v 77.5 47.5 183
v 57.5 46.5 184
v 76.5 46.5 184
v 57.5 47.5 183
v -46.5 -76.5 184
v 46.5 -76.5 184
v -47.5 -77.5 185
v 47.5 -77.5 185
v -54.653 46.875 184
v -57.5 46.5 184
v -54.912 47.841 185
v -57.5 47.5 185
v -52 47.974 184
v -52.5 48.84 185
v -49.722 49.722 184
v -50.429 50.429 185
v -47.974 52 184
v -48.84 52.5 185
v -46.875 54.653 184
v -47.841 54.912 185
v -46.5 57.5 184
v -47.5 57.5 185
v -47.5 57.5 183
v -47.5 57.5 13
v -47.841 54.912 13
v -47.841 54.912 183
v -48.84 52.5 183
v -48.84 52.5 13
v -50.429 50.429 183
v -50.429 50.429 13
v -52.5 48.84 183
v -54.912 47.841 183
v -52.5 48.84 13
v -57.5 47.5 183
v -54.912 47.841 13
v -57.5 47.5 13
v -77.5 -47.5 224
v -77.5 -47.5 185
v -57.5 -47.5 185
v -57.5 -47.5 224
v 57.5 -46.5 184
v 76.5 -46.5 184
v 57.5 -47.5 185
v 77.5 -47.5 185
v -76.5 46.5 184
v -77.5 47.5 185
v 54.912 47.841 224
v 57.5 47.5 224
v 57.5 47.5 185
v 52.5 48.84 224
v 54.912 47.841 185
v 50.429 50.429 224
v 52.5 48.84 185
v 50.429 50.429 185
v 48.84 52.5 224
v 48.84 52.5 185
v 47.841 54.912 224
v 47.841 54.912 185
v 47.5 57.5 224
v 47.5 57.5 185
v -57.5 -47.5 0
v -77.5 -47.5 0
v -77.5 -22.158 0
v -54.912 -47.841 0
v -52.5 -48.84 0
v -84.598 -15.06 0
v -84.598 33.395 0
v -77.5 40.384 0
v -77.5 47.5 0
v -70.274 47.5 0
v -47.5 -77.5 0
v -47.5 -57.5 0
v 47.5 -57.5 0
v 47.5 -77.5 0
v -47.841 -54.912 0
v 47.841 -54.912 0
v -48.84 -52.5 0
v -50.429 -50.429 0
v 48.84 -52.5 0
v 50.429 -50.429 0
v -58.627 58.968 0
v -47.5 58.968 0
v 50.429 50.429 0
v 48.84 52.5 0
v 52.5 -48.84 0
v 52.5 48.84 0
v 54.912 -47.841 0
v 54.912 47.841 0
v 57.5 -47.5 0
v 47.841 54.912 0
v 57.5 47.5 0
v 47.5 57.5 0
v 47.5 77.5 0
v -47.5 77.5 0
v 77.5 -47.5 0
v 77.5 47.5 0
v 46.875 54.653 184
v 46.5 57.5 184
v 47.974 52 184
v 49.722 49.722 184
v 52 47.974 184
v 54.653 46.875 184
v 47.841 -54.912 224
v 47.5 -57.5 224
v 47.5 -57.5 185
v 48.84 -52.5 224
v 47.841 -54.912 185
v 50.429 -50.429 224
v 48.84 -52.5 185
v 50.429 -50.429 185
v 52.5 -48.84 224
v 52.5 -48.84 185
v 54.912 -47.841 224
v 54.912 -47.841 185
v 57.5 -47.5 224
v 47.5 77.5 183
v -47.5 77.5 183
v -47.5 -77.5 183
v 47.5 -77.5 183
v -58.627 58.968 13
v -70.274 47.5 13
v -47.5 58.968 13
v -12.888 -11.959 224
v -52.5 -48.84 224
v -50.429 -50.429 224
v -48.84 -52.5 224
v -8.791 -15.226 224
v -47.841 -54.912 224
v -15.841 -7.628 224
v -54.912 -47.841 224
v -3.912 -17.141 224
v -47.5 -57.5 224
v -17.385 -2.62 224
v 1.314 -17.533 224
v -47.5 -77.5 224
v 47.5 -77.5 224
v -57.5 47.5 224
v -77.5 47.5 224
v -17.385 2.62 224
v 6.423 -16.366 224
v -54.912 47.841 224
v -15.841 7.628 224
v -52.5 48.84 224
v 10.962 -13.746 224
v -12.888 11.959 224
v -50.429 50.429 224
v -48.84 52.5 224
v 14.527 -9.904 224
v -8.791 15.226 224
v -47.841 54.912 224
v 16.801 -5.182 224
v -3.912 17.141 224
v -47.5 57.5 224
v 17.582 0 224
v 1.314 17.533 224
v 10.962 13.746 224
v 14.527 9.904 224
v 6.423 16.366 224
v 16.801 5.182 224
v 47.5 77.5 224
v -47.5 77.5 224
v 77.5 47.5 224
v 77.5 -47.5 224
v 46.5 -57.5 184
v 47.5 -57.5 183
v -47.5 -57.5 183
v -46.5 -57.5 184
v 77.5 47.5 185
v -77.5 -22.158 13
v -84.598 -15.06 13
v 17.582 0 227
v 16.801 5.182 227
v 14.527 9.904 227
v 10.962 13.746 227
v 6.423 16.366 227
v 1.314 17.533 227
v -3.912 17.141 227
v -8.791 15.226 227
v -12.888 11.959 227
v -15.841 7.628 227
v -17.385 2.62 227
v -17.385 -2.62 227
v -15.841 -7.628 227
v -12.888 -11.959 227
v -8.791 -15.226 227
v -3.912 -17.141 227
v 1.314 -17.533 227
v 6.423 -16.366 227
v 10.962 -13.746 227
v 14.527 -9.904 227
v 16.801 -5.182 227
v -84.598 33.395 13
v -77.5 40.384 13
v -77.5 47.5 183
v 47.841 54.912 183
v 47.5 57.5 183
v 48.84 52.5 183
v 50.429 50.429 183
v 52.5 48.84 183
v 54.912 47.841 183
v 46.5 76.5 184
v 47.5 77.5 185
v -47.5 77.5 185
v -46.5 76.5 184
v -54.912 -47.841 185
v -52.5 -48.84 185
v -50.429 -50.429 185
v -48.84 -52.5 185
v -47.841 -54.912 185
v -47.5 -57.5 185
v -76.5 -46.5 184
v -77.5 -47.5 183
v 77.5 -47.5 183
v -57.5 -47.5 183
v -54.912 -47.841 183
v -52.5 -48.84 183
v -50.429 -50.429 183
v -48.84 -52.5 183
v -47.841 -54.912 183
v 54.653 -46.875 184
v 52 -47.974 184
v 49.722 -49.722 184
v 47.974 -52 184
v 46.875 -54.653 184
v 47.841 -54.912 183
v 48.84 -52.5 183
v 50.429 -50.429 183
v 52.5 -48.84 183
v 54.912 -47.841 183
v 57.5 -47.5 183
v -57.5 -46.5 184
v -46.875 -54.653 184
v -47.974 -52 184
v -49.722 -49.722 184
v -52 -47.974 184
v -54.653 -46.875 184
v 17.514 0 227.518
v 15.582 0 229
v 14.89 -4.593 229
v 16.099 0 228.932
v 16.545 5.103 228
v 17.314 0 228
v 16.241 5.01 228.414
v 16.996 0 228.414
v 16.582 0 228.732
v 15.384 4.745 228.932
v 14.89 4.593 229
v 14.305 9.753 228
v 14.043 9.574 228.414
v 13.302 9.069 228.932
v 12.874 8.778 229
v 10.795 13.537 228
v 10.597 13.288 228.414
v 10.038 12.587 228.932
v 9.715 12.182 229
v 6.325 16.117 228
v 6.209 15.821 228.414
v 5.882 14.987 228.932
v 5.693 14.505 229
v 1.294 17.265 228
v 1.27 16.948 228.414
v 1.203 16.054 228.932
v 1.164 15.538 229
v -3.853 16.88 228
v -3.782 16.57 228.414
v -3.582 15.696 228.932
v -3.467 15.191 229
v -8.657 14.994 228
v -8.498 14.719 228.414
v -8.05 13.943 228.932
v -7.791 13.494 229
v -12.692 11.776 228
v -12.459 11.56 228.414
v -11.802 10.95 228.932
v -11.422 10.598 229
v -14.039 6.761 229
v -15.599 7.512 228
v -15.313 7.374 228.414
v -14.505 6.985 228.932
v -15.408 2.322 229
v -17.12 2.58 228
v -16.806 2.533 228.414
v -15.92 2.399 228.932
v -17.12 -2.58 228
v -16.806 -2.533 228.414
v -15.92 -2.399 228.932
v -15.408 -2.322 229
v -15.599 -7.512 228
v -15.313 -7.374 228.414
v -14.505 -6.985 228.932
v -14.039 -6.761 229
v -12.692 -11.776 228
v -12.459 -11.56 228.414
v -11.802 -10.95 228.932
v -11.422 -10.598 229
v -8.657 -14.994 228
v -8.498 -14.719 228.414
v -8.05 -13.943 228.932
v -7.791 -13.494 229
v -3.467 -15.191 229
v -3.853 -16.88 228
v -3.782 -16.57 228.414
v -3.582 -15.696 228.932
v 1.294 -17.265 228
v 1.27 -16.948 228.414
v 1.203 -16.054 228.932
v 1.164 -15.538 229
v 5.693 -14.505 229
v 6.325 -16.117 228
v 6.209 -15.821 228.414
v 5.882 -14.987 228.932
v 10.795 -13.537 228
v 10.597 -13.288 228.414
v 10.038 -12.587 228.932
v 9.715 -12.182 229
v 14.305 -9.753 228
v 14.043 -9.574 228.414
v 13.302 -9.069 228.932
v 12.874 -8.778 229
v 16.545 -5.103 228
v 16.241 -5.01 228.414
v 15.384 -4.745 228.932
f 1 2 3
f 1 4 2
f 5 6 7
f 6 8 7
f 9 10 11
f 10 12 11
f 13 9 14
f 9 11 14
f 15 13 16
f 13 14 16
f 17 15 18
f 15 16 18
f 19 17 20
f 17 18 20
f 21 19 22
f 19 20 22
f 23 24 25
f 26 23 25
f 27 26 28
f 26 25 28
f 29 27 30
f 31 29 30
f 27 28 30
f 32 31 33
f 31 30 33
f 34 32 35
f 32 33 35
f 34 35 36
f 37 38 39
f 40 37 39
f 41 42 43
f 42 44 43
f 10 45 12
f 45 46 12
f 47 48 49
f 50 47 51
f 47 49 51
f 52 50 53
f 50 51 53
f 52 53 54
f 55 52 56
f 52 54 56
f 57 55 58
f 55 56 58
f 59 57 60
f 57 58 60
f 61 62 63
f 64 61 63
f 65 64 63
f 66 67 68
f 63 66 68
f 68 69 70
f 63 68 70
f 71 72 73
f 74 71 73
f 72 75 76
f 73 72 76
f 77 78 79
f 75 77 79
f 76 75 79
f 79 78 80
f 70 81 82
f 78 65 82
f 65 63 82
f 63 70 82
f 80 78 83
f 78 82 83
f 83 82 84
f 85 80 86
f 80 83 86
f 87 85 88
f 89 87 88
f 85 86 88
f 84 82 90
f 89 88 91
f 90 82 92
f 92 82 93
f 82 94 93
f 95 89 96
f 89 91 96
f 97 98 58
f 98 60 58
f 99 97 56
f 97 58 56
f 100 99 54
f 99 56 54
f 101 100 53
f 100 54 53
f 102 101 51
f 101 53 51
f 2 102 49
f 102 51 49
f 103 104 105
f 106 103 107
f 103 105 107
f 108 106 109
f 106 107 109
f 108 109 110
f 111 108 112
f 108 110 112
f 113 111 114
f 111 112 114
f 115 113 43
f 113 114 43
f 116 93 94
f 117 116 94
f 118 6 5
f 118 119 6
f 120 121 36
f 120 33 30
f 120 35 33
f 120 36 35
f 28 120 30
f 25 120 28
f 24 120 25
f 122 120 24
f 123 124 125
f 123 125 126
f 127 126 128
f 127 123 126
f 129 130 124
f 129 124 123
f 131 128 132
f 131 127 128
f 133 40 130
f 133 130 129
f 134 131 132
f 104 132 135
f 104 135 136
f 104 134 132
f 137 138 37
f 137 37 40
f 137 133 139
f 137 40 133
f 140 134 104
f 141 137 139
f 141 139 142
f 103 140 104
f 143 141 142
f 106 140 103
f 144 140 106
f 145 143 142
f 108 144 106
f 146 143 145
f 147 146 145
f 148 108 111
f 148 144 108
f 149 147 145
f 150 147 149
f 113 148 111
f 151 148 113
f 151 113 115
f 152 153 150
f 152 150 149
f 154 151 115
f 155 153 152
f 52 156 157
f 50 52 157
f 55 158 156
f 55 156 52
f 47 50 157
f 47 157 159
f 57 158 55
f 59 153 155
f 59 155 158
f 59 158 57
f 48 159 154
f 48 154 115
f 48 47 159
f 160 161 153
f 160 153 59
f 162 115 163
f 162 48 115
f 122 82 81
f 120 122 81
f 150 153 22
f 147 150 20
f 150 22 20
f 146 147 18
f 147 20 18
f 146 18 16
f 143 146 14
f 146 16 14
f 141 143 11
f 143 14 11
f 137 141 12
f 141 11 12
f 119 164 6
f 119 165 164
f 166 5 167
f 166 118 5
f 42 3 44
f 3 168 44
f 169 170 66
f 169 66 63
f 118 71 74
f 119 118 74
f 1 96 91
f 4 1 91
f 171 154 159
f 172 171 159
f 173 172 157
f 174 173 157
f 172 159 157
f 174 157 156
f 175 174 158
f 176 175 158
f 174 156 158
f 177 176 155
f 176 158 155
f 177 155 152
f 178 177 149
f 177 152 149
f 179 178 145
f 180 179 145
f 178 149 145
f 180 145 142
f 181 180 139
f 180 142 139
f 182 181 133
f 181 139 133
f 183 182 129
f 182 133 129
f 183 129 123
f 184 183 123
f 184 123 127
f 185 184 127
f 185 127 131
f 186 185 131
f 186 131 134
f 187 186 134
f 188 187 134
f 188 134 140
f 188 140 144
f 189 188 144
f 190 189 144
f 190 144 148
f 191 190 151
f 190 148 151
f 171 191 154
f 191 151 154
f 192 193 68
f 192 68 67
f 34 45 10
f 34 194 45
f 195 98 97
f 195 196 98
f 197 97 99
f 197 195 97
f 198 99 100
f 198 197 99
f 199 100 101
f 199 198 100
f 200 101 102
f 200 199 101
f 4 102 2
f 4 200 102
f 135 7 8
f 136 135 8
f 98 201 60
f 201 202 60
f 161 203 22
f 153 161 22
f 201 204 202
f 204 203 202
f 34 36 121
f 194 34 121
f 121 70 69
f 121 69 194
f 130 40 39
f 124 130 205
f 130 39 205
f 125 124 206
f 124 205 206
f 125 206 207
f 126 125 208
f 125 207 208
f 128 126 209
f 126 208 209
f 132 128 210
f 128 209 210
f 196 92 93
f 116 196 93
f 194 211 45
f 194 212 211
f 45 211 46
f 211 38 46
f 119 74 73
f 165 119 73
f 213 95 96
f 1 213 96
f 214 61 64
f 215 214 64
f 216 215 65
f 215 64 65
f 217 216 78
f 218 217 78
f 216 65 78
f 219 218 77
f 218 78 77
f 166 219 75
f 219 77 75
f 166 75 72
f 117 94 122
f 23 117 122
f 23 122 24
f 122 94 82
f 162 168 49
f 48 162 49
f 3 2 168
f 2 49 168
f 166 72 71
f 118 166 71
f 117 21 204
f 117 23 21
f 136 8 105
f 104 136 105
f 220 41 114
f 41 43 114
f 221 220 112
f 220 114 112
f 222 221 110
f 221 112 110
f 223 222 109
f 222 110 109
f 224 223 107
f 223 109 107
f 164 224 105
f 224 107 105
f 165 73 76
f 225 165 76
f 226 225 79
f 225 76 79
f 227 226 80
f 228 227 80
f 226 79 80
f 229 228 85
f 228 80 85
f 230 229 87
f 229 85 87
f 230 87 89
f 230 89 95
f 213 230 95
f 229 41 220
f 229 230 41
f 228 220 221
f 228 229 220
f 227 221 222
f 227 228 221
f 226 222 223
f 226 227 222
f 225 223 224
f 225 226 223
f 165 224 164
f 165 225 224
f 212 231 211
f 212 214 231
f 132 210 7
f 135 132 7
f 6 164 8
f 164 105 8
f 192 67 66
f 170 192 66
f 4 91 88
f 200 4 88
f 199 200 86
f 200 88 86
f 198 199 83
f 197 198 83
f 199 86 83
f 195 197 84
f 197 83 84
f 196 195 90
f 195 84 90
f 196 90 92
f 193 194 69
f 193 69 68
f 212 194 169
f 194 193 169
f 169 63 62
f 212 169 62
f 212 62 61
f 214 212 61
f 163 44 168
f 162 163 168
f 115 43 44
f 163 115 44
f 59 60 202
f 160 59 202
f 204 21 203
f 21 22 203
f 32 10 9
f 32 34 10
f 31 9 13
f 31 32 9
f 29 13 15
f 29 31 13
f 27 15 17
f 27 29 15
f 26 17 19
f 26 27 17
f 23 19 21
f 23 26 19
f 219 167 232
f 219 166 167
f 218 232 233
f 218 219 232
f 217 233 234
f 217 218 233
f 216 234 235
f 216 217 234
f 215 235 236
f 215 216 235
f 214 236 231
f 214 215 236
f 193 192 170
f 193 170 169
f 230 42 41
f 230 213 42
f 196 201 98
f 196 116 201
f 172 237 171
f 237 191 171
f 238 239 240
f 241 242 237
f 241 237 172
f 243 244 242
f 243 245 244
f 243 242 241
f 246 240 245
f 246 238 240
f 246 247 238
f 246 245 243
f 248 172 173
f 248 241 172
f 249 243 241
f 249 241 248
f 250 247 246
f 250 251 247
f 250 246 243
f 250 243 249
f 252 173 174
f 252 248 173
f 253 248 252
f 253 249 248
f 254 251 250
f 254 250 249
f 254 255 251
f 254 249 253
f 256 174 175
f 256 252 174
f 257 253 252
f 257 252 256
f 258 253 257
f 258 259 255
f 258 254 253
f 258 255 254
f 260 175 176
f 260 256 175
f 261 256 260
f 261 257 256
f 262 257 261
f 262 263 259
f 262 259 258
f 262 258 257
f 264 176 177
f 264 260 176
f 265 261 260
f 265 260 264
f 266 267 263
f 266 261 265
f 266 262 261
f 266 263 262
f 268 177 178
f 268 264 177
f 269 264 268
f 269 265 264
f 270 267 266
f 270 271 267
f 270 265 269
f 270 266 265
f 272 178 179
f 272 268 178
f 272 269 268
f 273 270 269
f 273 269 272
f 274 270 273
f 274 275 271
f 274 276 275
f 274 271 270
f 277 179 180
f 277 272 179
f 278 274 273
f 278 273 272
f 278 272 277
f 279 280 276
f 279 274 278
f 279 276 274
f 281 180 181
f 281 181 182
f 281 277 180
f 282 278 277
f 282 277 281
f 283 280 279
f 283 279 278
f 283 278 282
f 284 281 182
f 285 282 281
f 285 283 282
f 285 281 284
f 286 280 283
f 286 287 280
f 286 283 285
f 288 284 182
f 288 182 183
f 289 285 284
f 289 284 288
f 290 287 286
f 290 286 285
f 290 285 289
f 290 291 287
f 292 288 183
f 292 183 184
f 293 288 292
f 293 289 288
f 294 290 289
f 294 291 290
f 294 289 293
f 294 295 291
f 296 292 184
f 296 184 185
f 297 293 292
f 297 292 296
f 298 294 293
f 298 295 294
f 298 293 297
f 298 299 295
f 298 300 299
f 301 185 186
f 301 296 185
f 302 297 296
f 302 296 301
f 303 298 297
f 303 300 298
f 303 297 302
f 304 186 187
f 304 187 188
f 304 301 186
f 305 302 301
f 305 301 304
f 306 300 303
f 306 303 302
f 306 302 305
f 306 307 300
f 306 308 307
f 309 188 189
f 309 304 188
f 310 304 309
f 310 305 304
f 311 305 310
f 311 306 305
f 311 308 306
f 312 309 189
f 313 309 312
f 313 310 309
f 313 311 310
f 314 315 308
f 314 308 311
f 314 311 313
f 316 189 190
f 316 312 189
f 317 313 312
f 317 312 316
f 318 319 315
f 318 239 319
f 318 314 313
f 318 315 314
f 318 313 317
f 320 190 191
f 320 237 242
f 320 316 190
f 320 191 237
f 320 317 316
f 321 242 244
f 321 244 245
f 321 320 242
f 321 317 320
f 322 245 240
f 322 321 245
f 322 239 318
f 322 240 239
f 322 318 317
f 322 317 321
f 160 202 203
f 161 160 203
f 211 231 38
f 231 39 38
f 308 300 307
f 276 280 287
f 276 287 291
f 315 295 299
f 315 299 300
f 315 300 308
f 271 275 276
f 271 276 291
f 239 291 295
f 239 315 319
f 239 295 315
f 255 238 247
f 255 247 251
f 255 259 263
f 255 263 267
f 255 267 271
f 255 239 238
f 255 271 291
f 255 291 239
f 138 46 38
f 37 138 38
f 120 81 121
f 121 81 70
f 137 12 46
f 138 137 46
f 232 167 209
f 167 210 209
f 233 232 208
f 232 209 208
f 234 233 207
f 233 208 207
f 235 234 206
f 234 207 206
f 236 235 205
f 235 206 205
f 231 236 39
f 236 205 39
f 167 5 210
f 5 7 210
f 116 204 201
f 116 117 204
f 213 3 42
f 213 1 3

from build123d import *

# Parameters (mm, degrees)
Y_KSEKLIK_EKSTR_ZYON1_DEPTH     = 13
Y_KSEKLIK_EKSTR_ZYON2_DEPTH     = 224
KES_EKSTR_ZYON1_DEPTH           = 1
KES_EKSTR_ZYON1_TAPER           = 45
KES_EKSTR_ZYON1_OTHER_WAY_DEPTH = 1
KES_EKSTR_ZYON1_OTHER_WAY_TAPER = 45
IZIM8_R                         = 17.581787387
Y_KSEKLIK_EKSTR_ZYON3_DEPTH     = 5
RADYUS2_R                       = 2


with BuildPart() as part:
    # Çizim1 → Yükseklik-Ekstrüzyon1 (new body)
    with BuildSketch(Plane.XY):
        Polygon((-58.626768768, 58.968306861), (-84.598484816, 33.394607486), (-84.598484816, -15.059977091), (-58.626768768, -41.031693139), (-10.172184191, -41.031693139), (15.401515184, -15.059977091), (15.401515184, 32.642615461), (-10.924176216, 58.968306861), align=None)
    extrude(amount=Y_KSEKLIK_EKSTR_ZYON1_DEPTH)

    # Çizim2 → Yükseklik-Ekstrüzyon2 (add)
    with BuildSketch(Plane.XY):
        with BuildLine():
            Line((47.5, 57.5), (47.5, 77.5))
            Line((47.5, 77.5), (-47.5, 77.5))
            Line((-47.5, 77.5), (-47.5, 57.5))
            ThreePointArc((-47.5, 57.5), (-50.428932188, 50.428932188), (-57.5, 47.5))
            Line((-57.5, 47.5), (-77.5, 47.5))
            Line((-77.5, 47.5), (-77.5, -47.5))
            Line((-77.5, -47.5), (-57.5, -47.5))
            ThreePointArc((-57.5, -47.5), (-50.428932188, -50.428932188), (-47.5, -57.5))
            Line((-47.5, -57.5), (-47.5, -77.5))
            Line((-47.5, -77.5), (47.5, -77.5))
            Line((47.5, -77.5), (47.5, -57.5))
            ThreePointArc((47.5, -57.5), (50.428932188, -50.428932188), (57.5, -47.5))
            Line((57.5, -47.5), (77.5, -47.5))
            Line((77.5, -47.5), (77.5, 47.5))
            Line((77.5, 47.5), (57.5, 47.5))
            ThreePointArc((57.5, 47.5), (50.428932188, 50.428932188), (47.5, 57.5))
        make_face()
    extrude(amount=Y_KSEKLIK_EKSTR_ZYON2_DEPTH)

    # Çizim7 → Kes-Ekstrüzyon1 (cut)
    with BuildSketch(Plane.XY.offset(184)):
        with BuildLine():
            Line((57.5, -56.5), (86.5, -56.5))
            Line((86.5, -56.5), (86.5, 56.5))
            Line((86.5, 56.5), (57.5, 56.5))
            ThreePointArc((57.5, 56.5), (56.792893219, 56.792893219), (56.5, 57.5))
            Line((56.5, 57.5), (56.5, 86.5))
            Line((56.5, 86.5), (-56.5, 86.5))
            Line((-56.5, 86.5), (-56.5, 57.5))
            ThreePointArc((-56.5, 57.5), (-56.792893219, 56.792893219), (-57.5, 56.5))
            Line((-57.5, 56.5), (-86.5, 56.5))
            Line((-86.5, 56.5), (-86.5, -56.5))
            Line((-86.5, -56.5), (-57.5, -56.5))
            ThreePointArc((-57.5, -56.5), (-56.792893219, -56.792893219), (-56.5, -57.5))
            Line((-56.5, -57.5), (-56.5, -86.5))
            Line((-56.5, -86.5), (56.5, -86.5))
            Line((56.5, -86.5), (56.5, -57.5))
            ThreePointArc((56.5, -57.5), (56.792893219, -56.792893219), (57.5, -56.5))
        make_face()
        with BuildLine():
            Line((-46.5, -76.5), (46.5, -76.5))
            Line((46.5, -76.5), (46.5, -57.5))
            ThreePointArc((46.5, -57.5), (49.721825407, -49.721825407), (57.5, -46.5))
            Line((57.5, -46.5), (76.5, -46.5))
            Line((76.5, -46.5), (76.5, 46.5))
            Line((76.5, 46.5), (57.5, 46.5))
            ThreePointArc((57.5, 46.5), (49.721825407, 49.721825407), (46.5, 57.5))
            Line((46.5, 57.5), (46.5, 76.5))
            Line((46.5, 76.5), (-46.5, 76.5))
            Line((-46.5, 76.5), (-46.5, 57.5))
            ThreePointArc((-46.5, 57.5), (-49.721825407, 49.721825407), (-57.5, 46.5))
            Line((-57.5, 46.5), (-76.5, 46.5))
            Line((-76.5, 46.5), (-76.5, -46.5))
            Line((-76.5, -46.5), (-57.5, -46.5))
            ThreePointArc((-57.5, -46.5), (-49.721825407, -49.721825407), (-46.5, -57.5))
            Line((-46.5, -57.5), (-46.5, -76.5))
        make_face(mode=Mode.SUBTRACT)
    extrude(amount=-KES_EKSTR_ZYON1_DEPTH, taper=KES_EKSTR_ZYON1_TAPER, mode=Mode.SUBTRACT)

    # Çizim7 → Kes-Ekstrüzyon1 other way (cut)
    with BuildSketch(Plane.XY.offset(184)):
        with BuildLine():
            Line((57.5, -56.5), (86.5, -56.5))
            Line((86.5, -56.5), (86.5, 56.5))
            Line((86.5, 56.5), (57.5, 56.5))
            ThreePointArc((57.5, 56.5), (56.792893219, 56.792893219), (56.5, 57.5))
            Line((56.5, 57.5), (56.5, 86.5))
            Line((56.5, 86.5), (-56.5, 86.5))
            Line((-56.5, 86.5), (-56.5, 57.5))
            ThreePointArc((-56.5, 57.5), (-56.792893219, 56.792893219), (-57.5, 56.5))
            Line((-57.5, 56.5), (-86.5, 56.5))
            Line((-86.5, 56.5), (-86.5, -56.5))
            Line((-86.5, -56.5), (-57.5, -56.5))
            ThreePointArc((-57.5, -56.5), (-56.792893219, -56.792893219), (-56.5, -57.5))
            Line((-56.5, -57.5), (-56.5, -86.5))
            Line((-56.5, -86.5), (56.5, -86.5))
            Line((56.5, -86.5), (56.5, -57.5))
            ThreePointArc((56.5, -57.5), (56.792893219, -56.792893219), (57.5, -56.5))
        make_face()
        with BuildLine():
            Line((-46.5, -76.5), (46.5, -76.5))
            Line((46.5, -76.5), (46.5, -57.5))
            ThreePointArc((46.5, -57.5), (49.721825407, -49.721825407), (57.5, -46.5))
            Line((57.5, -46.5), (76.5, -46.5))
            Line((76.5, -46.5), (76.5, 46.5))
            Line((76.5, 46.5), (57.5, 46.5))
            ThreePointArc((57.5, 46.5), (49.721825407, 49.721825407), (46.5, 57.5))
            Line((46.5, 57.5), (46.5, 76.5))
            Line((46.5, 76.5), (-46.5, 76.5))
            Line((-46.5, 76.5), (-46.5, 57.5))
            ThreePointArc((-46.5, 57.5), (-49.721825407, 49.721825407), (-57.5, 46.5))
            Line((-57.5, 46.5), (-76.5, 46.5))
            Line((-76.5, 46.5), (-76.5, -46.5))
            Line((-76.5, -46.5), (-57.5, -46.5))
            ThreePointArc((-57.5, -46.5), (-49.721825407, -49.721825407), (-46.5, -57.5))
            Line((-46.5, -57.5), (-46.5, -76.5))
        make_face(mode=Mode.SUBTRACT)
    extrude(amount=KES_EKSTR_ZYON1_OTHER_WAY_DEPTH, taper=KES_EKSTR_ZYON1_OTHER_WAY_TAPER, mode=Mode.SUBTRACT)

    # Çizim8 → Yükseklik-Ekstrüzyon3 (add)
    with BuildSketch(Plane.XY.offset(224)):
        Circle(IZIM8_R)
    extrude(amount=Y_KSEKLIK_EKSTR_ZYON3_DEPTH)

    # Radyus2
    radyus2_edges = [part.edges().sort_by_distance(p)[0] for p in [
        (-17.581787387, 0, 229),
    ]]
    fillet(radyus2_edges, radius=RADYUS2_R)


solid = part.part
